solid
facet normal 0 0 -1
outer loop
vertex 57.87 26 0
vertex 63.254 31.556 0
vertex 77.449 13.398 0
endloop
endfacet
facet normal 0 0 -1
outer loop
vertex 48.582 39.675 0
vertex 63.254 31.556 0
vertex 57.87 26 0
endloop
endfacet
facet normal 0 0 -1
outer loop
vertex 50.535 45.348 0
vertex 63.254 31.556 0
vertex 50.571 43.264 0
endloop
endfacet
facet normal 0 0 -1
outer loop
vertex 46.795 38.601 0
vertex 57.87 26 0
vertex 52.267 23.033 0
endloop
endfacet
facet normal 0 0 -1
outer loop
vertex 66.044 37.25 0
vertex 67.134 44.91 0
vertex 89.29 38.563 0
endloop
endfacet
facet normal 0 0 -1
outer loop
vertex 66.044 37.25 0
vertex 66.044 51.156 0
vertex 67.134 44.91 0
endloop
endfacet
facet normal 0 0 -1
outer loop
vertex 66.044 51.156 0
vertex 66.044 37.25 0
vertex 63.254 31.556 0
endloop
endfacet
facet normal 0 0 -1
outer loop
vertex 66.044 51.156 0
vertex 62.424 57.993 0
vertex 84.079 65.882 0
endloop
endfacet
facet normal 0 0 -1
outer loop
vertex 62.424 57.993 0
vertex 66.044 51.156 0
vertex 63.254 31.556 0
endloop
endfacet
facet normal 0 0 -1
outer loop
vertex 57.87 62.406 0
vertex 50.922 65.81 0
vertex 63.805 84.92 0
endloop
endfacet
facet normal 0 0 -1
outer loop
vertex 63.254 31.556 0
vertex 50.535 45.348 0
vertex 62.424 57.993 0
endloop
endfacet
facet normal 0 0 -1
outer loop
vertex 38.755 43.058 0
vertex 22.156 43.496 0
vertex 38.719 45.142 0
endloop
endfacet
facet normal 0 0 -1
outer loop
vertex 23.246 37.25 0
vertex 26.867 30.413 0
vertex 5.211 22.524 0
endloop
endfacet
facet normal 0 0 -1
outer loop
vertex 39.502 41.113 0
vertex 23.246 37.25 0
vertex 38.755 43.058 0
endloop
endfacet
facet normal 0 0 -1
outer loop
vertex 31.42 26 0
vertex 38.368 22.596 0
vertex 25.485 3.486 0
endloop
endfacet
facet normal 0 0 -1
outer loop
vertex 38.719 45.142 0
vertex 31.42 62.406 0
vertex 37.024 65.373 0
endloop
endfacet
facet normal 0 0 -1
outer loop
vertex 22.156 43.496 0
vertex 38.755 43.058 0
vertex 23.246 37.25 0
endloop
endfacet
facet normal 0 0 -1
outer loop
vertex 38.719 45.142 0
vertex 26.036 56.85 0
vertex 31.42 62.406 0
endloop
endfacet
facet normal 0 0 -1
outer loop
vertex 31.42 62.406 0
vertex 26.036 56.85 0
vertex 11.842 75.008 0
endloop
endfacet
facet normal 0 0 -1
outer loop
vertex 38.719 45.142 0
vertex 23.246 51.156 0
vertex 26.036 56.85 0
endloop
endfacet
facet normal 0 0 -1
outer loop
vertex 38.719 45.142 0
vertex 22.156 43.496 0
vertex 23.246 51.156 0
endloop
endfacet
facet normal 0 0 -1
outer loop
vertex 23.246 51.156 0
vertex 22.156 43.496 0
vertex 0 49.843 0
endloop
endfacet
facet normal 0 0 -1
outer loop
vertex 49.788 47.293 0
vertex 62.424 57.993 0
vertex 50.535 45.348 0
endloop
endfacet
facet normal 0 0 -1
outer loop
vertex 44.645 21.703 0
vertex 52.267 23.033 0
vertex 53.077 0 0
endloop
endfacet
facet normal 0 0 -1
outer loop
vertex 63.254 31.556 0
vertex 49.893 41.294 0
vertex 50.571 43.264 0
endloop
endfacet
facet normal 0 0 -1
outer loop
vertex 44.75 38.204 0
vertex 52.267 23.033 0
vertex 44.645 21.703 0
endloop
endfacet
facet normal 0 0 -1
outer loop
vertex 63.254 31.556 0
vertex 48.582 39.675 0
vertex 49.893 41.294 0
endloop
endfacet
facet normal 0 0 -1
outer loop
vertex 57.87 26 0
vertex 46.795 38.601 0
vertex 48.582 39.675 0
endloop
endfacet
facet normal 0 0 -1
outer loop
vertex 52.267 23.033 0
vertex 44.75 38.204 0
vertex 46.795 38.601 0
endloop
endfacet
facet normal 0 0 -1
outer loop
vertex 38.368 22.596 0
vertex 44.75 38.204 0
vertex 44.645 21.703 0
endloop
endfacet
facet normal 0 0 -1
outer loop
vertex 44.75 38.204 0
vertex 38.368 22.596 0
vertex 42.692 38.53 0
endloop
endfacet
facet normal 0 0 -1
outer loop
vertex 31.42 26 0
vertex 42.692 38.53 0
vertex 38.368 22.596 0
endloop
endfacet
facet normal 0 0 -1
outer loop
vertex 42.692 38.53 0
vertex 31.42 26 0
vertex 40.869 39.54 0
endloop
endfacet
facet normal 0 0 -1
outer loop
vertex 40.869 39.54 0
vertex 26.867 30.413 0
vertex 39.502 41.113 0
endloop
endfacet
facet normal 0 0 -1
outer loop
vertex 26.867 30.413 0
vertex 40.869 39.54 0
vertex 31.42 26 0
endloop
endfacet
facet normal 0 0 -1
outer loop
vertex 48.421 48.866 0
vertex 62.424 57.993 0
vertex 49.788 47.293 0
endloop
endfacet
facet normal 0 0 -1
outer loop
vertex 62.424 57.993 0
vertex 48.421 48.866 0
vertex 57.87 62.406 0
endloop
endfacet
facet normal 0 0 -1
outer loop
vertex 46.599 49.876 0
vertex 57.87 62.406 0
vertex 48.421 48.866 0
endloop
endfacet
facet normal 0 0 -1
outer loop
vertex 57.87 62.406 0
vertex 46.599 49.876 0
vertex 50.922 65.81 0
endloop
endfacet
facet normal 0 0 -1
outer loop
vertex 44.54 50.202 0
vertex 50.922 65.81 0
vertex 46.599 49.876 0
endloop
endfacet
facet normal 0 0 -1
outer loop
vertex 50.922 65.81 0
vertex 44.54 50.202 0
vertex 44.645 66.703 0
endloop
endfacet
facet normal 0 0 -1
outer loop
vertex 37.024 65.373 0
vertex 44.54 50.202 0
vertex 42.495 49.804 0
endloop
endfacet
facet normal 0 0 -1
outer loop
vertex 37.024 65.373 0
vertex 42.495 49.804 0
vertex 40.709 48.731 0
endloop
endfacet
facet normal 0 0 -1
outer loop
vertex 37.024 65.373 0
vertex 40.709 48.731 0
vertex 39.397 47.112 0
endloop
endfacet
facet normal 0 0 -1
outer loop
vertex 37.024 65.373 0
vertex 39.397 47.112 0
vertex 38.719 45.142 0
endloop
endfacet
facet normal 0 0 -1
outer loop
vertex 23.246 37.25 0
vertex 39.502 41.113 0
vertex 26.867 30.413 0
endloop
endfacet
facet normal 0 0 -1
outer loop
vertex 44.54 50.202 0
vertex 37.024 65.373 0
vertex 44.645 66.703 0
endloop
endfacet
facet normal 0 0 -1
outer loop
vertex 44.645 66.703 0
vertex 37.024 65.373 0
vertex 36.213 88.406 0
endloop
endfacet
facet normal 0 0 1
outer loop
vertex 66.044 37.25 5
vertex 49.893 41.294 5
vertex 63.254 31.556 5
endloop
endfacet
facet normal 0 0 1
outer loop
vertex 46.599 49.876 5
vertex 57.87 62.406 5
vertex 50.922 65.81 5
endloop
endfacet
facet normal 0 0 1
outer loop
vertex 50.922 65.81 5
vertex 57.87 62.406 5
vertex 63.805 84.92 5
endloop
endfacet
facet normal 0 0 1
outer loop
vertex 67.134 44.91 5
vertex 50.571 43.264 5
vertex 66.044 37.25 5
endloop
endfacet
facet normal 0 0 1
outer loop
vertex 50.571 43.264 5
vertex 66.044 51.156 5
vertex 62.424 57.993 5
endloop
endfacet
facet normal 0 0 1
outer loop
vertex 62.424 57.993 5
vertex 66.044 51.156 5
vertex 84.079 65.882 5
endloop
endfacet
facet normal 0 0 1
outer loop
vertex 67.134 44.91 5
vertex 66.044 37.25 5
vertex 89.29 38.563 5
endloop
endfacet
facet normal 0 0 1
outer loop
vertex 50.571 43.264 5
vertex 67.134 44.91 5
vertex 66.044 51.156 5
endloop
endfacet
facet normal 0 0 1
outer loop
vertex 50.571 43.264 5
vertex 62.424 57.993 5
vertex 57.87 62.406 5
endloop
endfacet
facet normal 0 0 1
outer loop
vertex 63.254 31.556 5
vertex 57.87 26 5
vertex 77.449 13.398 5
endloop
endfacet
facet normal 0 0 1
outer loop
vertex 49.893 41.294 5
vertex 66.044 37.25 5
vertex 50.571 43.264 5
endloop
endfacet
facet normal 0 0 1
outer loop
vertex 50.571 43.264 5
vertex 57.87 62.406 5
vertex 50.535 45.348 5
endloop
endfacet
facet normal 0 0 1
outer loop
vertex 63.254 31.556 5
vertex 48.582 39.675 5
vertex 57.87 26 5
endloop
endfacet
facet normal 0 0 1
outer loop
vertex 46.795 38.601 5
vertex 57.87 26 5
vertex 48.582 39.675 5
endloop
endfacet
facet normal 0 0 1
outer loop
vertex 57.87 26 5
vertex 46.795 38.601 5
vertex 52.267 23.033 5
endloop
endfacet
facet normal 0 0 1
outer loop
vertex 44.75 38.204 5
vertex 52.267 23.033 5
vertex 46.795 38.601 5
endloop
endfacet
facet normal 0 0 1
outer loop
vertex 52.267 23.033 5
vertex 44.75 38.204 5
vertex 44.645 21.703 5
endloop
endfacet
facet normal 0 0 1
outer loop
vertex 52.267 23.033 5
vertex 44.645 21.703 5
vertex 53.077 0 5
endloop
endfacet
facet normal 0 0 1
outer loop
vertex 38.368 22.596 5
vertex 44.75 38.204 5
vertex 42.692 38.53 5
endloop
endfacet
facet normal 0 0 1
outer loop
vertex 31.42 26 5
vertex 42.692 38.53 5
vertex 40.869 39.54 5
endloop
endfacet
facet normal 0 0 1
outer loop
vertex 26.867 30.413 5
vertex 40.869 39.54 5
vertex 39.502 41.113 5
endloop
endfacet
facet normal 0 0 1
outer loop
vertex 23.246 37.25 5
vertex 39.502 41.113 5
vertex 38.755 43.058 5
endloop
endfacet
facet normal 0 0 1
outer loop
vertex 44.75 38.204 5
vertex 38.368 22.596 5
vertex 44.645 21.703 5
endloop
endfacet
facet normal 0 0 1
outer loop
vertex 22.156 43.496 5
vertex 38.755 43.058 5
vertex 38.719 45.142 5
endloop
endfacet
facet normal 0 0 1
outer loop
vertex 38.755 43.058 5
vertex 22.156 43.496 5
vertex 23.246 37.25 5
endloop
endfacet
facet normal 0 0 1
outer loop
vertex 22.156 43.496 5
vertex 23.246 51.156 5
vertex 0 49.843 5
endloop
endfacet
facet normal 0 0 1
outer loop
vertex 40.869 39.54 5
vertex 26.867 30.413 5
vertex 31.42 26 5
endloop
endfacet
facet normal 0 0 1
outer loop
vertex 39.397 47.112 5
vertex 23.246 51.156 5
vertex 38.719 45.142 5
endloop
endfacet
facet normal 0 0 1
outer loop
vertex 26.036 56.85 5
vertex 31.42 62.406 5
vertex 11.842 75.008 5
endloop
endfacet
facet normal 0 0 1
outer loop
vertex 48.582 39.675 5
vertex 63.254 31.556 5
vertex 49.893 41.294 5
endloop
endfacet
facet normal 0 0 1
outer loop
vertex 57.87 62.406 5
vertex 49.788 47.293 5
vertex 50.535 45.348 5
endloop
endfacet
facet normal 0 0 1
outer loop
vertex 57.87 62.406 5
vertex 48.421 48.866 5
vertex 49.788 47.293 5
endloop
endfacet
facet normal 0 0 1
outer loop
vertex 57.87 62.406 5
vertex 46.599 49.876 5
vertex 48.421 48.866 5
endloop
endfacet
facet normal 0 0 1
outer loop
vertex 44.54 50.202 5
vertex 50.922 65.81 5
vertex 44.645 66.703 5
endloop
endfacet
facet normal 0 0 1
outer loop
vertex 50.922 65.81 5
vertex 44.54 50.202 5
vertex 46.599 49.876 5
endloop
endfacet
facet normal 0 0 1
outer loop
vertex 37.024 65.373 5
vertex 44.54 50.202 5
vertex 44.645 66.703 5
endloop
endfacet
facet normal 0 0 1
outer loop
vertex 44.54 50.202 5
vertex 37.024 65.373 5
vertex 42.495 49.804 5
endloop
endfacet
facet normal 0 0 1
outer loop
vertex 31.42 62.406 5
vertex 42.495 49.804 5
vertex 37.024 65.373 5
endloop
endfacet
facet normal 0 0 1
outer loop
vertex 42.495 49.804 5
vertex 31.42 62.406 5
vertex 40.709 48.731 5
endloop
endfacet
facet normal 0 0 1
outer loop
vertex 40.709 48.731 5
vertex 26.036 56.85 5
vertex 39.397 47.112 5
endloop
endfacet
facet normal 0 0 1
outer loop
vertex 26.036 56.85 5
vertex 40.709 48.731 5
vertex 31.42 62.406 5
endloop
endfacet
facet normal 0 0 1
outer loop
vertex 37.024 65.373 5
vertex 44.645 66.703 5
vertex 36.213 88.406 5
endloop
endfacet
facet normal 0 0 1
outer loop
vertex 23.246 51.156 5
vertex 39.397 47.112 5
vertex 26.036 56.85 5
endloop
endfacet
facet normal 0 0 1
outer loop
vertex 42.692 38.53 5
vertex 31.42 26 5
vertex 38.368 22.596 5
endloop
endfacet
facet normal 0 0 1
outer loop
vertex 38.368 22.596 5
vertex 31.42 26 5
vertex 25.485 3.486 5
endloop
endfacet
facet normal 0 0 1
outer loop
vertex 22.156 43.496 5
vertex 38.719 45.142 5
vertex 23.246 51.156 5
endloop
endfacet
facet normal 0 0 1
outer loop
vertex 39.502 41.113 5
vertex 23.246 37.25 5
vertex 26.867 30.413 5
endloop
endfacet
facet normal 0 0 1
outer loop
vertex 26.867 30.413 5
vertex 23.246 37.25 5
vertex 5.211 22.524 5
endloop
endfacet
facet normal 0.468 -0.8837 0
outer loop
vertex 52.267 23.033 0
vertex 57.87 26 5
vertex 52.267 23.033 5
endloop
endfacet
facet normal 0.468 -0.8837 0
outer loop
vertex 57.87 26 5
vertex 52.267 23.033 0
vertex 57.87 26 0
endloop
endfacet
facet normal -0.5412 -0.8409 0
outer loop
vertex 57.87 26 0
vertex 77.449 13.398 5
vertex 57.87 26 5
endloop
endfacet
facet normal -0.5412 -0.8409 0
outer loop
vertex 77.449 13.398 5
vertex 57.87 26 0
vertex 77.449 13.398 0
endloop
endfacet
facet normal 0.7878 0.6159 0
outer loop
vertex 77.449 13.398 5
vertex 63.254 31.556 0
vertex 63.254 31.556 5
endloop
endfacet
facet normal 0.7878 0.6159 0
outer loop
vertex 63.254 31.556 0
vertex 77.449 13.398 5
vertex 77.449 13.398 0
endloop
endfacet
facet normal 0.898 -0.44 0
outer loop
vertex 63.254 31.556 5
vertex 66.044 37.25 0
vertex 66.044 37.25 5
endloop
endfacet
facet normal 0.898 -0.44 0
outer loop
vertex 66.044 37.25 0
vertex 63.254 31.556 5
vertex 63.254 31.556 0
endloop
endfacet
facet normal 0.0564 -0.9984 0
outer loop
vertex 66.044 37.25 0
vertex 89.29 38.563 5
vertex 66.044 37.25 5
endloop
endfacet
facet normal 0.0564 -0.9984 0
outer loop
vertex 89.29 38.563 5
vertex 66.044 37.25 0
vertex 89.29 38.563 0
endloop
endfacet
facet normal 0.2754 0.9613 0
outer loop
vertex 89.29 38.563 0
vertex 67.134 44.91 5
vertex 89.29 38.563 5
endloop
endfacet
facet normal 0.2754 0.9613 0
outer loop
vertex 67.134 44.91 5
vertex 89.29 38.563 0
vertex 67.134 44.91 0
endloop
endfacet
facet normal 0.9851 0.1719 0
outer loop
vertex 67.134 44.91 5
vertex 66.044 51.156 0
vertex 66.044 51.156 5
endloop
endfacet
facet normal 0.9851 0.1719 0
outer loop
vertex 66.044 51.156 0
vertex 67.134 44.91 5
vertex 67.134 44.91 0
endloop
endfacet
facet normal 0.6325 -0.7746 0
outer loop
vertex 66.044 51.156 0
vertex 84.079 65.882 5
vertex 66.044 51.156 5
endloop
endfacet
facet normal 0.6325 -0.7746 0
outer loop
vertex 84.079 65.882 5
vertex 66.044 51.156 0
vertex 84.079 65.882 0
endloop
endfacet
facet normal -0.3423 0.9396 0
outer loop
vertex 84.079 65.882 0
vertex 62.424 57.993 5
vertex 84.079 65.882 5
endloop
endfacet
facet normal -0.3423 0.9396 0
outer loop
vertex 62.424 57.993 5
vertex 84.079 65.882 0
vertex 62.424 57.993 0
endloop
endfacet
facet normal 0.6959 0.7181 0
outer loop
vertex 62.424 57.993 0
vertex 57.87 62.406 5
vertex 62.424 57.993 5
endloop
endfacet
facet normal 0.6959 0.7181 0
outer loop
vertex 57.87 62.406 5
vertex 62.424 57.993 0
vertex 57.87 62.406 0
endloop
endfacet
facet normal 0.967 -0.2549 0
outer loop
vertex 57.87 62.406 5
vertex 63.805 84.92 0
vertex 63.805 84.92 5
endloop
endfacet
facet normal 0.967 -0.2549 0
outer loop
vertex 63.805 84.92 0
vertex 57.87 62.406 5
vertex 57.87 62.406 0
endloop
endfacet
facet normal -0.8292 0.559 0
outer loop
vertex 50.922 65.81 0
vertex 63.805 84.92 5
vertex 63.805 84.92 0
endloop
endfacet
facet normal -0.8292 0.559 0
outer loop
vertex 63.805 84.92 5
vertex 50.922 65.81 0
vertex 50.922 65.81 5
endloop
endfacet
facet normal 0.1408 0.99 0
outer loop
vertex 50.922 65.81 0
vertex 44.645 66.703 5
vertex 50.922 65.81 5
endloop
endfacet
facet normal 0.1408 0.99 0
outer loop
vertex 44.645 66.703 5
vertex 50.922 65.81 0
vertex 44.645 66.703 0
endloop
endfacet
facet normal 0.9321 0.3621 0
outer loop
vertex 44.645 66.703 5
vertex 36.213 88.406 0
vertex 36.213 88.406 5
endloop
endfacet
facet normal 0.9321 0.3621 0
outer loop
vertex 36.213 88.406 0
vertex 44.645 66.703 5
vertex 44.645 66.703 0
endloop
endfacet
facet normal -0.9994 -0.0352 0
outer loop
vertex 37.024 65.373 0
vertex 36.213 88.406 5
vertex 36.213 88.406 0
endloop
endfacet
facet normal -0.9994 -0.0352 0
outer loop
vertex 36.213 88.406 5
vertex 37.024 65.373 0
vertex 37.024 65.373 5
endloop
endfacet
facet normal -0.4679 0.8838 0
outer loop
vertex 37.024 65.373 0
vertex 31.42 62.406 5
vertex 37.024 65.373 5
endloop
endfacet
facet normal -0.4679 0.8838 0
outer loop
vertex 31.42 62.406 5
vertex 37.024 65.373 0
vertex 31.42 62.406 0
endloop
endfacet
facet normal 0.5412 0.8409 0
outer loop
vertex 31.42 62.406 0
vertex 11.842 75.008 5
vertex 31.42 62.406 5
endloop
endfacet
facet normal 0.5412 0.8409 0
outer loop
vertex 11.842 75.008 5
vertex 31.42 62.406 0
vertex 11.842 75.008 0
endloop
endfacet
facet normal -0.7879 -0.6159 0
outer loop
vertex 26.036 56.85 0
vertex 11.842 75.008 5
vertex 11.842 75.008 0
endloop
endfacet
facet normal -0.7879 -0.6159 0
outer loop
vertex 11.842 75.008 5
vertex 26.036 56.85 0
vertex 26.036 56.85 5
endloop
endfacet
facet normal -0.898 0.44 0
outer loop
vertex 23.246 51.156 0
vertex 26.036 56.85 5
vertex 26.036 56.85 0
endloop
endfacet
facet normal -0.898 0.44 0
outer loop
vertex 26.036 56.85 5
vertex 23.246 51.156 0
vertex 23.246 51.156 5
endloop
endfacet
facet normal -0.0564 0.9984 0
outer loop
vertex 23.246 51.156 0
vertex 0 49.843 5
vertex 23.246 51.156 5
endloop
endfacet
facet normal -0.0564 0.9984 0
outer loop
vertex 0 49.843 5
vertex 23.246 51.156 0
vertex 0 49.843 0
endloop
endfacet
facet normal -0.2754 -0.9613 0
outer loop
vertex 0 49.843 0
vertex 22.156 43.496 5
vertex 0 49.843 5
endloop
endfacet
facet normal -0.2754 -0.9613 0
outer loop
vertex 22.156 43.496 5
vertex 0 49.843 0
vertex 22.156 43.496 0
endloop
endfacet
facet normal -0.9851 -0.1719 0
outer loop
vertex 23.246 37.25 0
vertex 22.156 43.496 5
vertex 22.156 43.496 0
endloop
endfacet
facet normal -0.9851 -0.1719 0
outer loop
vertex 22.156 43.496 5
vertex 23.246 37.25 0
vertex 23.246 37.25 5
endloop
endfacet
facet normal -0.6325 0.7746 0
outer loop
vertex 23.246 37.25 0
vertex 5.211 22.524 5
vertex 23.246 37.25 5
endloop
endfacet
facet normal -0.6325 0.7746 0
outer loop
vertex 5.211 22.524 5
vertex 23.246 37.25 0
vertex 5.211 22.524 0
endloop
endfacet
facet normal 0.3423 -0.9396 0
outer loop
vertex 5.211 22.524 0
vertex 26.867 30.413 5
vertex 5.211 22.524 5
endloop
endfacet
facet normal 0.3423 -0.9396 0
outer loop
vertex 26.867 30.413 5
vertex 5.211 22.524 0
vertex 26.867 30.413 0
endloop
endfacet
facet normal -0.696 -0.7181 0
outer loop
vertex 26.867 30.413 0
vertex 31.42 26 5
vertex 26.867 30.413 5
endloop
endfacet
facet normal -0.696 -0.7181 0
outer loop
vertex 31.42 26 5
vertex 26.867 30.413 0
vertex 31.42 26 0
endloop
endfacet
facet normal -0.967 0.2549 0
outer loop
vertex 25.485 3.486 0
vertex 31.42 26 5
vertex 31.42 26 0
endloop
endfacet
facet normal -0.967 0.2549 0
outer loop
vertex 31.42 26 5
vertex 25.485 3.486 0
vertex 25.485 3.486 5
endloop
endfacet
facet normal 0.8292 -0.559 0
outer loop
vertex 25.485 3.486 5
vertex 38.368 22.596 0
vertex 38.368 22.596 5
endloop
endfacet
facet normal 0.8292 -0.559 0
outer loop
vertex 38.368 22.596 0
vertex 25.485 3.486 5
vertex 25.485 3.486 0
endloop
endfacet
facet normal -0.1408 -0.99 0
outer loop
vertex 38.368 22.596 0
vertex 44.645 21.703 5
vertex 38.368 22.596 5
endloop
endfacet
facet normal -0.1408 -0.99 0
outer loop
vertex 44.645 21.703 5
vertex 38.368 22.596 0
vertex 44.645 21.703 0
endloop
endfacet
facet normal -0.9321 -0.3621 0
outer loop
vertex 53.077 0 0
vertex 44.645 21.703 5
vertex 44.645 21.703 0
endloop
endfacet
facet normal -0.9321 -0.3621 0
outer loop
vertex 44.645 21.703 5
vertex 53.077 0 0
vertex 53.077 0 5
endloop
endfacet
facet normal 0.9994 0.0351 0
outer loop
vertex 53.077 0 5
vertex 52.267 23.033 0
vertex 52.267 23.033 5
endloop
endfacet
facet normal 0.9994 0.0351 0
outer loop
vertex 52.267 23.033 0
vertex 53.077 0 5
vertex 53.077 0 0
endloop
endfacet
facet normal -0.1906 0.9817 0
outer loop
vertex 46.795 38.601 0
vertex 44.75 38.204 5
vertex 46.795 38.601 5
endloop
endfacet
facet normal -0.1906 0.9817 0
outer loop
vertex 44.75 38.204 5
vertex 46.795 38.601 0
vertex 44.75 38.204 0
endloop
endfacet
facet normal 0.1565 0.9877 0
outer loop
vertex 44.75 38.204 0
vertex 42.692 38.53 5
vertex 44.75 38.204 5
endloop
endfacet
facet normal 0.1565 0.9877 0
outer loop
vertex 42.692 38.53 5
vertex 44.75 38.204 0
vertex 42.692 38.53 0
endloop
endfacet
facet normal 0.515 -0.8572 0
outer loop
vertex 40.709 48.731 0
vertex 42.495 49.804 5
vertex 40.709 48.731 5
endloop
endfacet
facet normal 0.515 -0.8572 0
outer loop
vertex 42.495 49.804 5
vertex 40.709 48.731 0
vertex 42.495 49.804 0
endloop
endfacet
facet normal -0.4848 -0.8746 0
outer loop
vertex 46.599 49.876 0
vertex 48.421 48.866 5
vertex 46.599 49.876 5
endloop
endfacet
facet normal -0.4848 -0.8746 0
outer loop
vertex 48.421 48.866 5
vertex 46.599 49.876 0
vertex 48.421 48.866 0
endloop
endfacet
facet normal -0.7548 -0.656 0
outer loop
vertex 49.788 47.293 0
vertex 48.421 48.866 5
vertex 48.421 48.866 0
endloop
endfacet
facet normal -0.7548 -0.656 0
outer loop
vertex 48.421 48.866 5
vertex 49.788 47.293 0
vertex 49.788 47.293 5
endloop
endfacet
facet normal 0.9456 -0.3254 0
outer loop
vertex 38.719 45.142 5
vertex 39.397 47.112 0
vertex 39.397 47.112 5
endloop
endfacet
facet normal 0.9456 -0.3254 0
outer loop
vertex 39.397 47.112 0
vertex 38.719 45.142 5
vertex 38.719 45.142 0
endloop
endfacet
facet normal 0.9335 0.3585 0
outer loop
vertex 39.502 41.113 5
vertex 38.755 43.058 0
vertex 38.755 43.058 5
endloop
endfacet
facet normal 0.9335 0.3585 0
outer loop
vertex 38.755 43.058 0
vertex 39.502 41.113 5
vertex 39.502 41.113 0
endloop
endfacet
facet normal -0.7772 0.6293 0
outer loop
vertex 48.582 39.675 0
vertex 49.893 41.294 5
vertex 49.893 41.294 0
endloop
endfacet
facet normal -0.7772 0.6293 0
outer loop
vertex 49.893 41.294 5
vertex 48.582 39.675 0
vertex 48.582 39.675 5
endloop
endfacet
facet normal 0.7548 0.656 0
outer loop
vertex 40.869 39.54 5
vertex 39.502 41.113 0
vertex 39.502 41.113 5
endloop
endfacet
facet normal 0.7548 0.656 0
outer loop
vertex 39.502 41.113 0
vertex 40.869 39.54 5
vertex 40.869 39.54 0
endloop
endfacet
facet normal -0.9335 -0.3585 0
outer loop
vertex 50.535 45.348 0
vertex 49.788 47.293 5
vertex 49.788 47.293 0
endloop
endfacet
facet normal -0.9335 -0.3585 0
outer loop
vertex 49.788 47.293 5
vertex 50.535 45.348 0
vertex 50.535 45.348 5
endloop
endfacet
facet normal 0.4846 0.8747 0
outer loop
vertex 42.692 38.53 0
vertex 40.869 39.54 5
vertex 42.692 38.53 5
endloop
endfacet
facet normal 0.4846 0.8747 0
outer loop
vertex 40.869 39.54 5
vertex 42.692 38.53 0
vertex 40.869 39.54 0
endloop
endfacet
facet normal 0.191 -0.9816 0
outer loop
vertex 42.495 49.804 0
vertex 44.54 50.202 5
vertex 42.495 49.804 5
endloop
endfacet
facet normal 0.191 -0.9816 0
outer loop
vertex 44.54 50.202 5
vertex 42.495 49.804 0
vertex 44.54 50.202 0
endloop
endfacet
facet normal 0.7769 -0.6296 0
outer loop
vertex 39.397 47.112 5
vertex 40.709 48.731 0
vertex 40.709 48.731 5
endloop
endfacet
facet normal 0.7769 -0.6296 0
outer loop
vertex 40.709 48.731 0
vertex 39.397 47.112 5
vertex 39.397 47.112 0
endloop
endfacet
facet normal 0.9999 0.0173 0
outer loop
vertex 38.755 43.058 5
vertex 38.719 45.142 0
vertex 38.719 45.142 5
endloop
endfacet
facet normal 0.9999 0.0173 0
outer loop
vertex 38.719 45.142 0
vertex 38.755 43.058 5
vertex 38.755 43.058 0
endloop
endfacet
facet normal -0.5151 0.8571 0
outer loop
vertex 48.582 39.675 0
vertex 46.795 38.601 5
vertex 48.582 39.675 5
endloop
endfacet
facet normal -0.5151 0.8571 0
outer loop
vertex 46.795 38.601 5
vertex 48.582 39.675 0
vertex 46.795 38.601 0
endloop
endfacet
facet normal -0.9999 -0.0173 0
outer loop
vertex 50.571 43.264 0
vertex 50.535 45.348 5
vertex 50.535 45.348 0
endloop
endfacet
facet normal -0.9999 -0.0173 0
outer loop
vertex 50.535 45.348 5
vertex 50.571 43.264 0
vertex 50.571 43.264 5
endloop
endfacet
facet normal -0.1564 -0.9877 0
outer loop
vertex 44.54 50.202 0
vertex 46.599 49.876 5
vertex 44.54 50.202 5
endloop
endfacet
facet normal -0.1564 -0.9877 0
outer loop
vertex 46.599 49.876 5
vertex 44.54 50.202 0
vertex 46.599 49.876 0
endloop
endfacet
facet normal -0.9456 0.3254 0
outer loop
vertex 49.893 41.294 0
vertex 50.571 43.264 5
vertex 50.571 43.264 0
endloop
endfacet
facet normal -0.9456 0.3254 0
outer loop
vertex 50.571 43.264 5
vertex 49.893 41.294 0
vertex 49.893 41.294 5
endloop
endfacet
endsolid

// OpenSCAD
$fn = 32;

// ----------------------------------------------------------------------
// Star wheel: 10-point ratchet, R45
// ----------------------------------------------------------------------

// --- parameters (mm) ---
n_points = 10;            // number of points / teeth
r_out = 45;               // tip radius
r_in = 22.5;              // root radius
bore_r = 6;               // centre bore radius
plate_t = 5;              // plate thickness, Z (extrusion height)
bore_d = 12;              // centre bore diameter

profile = [[44.645, 66.703], [36.213, 88.406], [37.024, 65.373], [31.42, 62.406], [11.842, 75.008], [26.036, 56.85], [23.246, 51.156], [0, 49.843], [22.156, 43.496], [23.246, 37.25], [5.211, 22.524], [26.867, 30.413], [31.42, 26], [25.485, 3.486], [38.368, 22.596], [44.645, 21.703], [53.077, 0], [52.267, 23.033], [57.87, 26], [77.449, 13.398], [63.254, 31.556], [66.044, 37.25], [89.29, 38.563], [67.134, 44.91], [66.044, 51.156], [84.079, 65.882], [62.424, 57.993], [57.87, 62.406], [63.805, 84.92], [50.922, 65.81]];  // primary outline, 30 points, counter clockwise
void_1 = [[50.535, 45.348], [49.788, 47.293], [48.421, 48.866], [46.599, 49.876], [44.54, 50.202], [42.495, 49.804], [40.709, 48.731], [39.397, 47.112], [38.719, 45.142], [38.755, 43.058], [39.502, 41.113], [40.869, 39.54], [42.692, 38.53], [44.75, 38.204], [46.795, 38.601], [48.582, 39.675], [49.893, 41.294], [50.571, 43.264]];  // centre bore, 18 points

// --- the one profile operation ---
difference() {
  linear_extrude(height = plate_t) polygon(points = profile);
  translate([0, 0, -1])
    linear_extrude(height = plate_t + 2) polygon(points = void_1);
}
